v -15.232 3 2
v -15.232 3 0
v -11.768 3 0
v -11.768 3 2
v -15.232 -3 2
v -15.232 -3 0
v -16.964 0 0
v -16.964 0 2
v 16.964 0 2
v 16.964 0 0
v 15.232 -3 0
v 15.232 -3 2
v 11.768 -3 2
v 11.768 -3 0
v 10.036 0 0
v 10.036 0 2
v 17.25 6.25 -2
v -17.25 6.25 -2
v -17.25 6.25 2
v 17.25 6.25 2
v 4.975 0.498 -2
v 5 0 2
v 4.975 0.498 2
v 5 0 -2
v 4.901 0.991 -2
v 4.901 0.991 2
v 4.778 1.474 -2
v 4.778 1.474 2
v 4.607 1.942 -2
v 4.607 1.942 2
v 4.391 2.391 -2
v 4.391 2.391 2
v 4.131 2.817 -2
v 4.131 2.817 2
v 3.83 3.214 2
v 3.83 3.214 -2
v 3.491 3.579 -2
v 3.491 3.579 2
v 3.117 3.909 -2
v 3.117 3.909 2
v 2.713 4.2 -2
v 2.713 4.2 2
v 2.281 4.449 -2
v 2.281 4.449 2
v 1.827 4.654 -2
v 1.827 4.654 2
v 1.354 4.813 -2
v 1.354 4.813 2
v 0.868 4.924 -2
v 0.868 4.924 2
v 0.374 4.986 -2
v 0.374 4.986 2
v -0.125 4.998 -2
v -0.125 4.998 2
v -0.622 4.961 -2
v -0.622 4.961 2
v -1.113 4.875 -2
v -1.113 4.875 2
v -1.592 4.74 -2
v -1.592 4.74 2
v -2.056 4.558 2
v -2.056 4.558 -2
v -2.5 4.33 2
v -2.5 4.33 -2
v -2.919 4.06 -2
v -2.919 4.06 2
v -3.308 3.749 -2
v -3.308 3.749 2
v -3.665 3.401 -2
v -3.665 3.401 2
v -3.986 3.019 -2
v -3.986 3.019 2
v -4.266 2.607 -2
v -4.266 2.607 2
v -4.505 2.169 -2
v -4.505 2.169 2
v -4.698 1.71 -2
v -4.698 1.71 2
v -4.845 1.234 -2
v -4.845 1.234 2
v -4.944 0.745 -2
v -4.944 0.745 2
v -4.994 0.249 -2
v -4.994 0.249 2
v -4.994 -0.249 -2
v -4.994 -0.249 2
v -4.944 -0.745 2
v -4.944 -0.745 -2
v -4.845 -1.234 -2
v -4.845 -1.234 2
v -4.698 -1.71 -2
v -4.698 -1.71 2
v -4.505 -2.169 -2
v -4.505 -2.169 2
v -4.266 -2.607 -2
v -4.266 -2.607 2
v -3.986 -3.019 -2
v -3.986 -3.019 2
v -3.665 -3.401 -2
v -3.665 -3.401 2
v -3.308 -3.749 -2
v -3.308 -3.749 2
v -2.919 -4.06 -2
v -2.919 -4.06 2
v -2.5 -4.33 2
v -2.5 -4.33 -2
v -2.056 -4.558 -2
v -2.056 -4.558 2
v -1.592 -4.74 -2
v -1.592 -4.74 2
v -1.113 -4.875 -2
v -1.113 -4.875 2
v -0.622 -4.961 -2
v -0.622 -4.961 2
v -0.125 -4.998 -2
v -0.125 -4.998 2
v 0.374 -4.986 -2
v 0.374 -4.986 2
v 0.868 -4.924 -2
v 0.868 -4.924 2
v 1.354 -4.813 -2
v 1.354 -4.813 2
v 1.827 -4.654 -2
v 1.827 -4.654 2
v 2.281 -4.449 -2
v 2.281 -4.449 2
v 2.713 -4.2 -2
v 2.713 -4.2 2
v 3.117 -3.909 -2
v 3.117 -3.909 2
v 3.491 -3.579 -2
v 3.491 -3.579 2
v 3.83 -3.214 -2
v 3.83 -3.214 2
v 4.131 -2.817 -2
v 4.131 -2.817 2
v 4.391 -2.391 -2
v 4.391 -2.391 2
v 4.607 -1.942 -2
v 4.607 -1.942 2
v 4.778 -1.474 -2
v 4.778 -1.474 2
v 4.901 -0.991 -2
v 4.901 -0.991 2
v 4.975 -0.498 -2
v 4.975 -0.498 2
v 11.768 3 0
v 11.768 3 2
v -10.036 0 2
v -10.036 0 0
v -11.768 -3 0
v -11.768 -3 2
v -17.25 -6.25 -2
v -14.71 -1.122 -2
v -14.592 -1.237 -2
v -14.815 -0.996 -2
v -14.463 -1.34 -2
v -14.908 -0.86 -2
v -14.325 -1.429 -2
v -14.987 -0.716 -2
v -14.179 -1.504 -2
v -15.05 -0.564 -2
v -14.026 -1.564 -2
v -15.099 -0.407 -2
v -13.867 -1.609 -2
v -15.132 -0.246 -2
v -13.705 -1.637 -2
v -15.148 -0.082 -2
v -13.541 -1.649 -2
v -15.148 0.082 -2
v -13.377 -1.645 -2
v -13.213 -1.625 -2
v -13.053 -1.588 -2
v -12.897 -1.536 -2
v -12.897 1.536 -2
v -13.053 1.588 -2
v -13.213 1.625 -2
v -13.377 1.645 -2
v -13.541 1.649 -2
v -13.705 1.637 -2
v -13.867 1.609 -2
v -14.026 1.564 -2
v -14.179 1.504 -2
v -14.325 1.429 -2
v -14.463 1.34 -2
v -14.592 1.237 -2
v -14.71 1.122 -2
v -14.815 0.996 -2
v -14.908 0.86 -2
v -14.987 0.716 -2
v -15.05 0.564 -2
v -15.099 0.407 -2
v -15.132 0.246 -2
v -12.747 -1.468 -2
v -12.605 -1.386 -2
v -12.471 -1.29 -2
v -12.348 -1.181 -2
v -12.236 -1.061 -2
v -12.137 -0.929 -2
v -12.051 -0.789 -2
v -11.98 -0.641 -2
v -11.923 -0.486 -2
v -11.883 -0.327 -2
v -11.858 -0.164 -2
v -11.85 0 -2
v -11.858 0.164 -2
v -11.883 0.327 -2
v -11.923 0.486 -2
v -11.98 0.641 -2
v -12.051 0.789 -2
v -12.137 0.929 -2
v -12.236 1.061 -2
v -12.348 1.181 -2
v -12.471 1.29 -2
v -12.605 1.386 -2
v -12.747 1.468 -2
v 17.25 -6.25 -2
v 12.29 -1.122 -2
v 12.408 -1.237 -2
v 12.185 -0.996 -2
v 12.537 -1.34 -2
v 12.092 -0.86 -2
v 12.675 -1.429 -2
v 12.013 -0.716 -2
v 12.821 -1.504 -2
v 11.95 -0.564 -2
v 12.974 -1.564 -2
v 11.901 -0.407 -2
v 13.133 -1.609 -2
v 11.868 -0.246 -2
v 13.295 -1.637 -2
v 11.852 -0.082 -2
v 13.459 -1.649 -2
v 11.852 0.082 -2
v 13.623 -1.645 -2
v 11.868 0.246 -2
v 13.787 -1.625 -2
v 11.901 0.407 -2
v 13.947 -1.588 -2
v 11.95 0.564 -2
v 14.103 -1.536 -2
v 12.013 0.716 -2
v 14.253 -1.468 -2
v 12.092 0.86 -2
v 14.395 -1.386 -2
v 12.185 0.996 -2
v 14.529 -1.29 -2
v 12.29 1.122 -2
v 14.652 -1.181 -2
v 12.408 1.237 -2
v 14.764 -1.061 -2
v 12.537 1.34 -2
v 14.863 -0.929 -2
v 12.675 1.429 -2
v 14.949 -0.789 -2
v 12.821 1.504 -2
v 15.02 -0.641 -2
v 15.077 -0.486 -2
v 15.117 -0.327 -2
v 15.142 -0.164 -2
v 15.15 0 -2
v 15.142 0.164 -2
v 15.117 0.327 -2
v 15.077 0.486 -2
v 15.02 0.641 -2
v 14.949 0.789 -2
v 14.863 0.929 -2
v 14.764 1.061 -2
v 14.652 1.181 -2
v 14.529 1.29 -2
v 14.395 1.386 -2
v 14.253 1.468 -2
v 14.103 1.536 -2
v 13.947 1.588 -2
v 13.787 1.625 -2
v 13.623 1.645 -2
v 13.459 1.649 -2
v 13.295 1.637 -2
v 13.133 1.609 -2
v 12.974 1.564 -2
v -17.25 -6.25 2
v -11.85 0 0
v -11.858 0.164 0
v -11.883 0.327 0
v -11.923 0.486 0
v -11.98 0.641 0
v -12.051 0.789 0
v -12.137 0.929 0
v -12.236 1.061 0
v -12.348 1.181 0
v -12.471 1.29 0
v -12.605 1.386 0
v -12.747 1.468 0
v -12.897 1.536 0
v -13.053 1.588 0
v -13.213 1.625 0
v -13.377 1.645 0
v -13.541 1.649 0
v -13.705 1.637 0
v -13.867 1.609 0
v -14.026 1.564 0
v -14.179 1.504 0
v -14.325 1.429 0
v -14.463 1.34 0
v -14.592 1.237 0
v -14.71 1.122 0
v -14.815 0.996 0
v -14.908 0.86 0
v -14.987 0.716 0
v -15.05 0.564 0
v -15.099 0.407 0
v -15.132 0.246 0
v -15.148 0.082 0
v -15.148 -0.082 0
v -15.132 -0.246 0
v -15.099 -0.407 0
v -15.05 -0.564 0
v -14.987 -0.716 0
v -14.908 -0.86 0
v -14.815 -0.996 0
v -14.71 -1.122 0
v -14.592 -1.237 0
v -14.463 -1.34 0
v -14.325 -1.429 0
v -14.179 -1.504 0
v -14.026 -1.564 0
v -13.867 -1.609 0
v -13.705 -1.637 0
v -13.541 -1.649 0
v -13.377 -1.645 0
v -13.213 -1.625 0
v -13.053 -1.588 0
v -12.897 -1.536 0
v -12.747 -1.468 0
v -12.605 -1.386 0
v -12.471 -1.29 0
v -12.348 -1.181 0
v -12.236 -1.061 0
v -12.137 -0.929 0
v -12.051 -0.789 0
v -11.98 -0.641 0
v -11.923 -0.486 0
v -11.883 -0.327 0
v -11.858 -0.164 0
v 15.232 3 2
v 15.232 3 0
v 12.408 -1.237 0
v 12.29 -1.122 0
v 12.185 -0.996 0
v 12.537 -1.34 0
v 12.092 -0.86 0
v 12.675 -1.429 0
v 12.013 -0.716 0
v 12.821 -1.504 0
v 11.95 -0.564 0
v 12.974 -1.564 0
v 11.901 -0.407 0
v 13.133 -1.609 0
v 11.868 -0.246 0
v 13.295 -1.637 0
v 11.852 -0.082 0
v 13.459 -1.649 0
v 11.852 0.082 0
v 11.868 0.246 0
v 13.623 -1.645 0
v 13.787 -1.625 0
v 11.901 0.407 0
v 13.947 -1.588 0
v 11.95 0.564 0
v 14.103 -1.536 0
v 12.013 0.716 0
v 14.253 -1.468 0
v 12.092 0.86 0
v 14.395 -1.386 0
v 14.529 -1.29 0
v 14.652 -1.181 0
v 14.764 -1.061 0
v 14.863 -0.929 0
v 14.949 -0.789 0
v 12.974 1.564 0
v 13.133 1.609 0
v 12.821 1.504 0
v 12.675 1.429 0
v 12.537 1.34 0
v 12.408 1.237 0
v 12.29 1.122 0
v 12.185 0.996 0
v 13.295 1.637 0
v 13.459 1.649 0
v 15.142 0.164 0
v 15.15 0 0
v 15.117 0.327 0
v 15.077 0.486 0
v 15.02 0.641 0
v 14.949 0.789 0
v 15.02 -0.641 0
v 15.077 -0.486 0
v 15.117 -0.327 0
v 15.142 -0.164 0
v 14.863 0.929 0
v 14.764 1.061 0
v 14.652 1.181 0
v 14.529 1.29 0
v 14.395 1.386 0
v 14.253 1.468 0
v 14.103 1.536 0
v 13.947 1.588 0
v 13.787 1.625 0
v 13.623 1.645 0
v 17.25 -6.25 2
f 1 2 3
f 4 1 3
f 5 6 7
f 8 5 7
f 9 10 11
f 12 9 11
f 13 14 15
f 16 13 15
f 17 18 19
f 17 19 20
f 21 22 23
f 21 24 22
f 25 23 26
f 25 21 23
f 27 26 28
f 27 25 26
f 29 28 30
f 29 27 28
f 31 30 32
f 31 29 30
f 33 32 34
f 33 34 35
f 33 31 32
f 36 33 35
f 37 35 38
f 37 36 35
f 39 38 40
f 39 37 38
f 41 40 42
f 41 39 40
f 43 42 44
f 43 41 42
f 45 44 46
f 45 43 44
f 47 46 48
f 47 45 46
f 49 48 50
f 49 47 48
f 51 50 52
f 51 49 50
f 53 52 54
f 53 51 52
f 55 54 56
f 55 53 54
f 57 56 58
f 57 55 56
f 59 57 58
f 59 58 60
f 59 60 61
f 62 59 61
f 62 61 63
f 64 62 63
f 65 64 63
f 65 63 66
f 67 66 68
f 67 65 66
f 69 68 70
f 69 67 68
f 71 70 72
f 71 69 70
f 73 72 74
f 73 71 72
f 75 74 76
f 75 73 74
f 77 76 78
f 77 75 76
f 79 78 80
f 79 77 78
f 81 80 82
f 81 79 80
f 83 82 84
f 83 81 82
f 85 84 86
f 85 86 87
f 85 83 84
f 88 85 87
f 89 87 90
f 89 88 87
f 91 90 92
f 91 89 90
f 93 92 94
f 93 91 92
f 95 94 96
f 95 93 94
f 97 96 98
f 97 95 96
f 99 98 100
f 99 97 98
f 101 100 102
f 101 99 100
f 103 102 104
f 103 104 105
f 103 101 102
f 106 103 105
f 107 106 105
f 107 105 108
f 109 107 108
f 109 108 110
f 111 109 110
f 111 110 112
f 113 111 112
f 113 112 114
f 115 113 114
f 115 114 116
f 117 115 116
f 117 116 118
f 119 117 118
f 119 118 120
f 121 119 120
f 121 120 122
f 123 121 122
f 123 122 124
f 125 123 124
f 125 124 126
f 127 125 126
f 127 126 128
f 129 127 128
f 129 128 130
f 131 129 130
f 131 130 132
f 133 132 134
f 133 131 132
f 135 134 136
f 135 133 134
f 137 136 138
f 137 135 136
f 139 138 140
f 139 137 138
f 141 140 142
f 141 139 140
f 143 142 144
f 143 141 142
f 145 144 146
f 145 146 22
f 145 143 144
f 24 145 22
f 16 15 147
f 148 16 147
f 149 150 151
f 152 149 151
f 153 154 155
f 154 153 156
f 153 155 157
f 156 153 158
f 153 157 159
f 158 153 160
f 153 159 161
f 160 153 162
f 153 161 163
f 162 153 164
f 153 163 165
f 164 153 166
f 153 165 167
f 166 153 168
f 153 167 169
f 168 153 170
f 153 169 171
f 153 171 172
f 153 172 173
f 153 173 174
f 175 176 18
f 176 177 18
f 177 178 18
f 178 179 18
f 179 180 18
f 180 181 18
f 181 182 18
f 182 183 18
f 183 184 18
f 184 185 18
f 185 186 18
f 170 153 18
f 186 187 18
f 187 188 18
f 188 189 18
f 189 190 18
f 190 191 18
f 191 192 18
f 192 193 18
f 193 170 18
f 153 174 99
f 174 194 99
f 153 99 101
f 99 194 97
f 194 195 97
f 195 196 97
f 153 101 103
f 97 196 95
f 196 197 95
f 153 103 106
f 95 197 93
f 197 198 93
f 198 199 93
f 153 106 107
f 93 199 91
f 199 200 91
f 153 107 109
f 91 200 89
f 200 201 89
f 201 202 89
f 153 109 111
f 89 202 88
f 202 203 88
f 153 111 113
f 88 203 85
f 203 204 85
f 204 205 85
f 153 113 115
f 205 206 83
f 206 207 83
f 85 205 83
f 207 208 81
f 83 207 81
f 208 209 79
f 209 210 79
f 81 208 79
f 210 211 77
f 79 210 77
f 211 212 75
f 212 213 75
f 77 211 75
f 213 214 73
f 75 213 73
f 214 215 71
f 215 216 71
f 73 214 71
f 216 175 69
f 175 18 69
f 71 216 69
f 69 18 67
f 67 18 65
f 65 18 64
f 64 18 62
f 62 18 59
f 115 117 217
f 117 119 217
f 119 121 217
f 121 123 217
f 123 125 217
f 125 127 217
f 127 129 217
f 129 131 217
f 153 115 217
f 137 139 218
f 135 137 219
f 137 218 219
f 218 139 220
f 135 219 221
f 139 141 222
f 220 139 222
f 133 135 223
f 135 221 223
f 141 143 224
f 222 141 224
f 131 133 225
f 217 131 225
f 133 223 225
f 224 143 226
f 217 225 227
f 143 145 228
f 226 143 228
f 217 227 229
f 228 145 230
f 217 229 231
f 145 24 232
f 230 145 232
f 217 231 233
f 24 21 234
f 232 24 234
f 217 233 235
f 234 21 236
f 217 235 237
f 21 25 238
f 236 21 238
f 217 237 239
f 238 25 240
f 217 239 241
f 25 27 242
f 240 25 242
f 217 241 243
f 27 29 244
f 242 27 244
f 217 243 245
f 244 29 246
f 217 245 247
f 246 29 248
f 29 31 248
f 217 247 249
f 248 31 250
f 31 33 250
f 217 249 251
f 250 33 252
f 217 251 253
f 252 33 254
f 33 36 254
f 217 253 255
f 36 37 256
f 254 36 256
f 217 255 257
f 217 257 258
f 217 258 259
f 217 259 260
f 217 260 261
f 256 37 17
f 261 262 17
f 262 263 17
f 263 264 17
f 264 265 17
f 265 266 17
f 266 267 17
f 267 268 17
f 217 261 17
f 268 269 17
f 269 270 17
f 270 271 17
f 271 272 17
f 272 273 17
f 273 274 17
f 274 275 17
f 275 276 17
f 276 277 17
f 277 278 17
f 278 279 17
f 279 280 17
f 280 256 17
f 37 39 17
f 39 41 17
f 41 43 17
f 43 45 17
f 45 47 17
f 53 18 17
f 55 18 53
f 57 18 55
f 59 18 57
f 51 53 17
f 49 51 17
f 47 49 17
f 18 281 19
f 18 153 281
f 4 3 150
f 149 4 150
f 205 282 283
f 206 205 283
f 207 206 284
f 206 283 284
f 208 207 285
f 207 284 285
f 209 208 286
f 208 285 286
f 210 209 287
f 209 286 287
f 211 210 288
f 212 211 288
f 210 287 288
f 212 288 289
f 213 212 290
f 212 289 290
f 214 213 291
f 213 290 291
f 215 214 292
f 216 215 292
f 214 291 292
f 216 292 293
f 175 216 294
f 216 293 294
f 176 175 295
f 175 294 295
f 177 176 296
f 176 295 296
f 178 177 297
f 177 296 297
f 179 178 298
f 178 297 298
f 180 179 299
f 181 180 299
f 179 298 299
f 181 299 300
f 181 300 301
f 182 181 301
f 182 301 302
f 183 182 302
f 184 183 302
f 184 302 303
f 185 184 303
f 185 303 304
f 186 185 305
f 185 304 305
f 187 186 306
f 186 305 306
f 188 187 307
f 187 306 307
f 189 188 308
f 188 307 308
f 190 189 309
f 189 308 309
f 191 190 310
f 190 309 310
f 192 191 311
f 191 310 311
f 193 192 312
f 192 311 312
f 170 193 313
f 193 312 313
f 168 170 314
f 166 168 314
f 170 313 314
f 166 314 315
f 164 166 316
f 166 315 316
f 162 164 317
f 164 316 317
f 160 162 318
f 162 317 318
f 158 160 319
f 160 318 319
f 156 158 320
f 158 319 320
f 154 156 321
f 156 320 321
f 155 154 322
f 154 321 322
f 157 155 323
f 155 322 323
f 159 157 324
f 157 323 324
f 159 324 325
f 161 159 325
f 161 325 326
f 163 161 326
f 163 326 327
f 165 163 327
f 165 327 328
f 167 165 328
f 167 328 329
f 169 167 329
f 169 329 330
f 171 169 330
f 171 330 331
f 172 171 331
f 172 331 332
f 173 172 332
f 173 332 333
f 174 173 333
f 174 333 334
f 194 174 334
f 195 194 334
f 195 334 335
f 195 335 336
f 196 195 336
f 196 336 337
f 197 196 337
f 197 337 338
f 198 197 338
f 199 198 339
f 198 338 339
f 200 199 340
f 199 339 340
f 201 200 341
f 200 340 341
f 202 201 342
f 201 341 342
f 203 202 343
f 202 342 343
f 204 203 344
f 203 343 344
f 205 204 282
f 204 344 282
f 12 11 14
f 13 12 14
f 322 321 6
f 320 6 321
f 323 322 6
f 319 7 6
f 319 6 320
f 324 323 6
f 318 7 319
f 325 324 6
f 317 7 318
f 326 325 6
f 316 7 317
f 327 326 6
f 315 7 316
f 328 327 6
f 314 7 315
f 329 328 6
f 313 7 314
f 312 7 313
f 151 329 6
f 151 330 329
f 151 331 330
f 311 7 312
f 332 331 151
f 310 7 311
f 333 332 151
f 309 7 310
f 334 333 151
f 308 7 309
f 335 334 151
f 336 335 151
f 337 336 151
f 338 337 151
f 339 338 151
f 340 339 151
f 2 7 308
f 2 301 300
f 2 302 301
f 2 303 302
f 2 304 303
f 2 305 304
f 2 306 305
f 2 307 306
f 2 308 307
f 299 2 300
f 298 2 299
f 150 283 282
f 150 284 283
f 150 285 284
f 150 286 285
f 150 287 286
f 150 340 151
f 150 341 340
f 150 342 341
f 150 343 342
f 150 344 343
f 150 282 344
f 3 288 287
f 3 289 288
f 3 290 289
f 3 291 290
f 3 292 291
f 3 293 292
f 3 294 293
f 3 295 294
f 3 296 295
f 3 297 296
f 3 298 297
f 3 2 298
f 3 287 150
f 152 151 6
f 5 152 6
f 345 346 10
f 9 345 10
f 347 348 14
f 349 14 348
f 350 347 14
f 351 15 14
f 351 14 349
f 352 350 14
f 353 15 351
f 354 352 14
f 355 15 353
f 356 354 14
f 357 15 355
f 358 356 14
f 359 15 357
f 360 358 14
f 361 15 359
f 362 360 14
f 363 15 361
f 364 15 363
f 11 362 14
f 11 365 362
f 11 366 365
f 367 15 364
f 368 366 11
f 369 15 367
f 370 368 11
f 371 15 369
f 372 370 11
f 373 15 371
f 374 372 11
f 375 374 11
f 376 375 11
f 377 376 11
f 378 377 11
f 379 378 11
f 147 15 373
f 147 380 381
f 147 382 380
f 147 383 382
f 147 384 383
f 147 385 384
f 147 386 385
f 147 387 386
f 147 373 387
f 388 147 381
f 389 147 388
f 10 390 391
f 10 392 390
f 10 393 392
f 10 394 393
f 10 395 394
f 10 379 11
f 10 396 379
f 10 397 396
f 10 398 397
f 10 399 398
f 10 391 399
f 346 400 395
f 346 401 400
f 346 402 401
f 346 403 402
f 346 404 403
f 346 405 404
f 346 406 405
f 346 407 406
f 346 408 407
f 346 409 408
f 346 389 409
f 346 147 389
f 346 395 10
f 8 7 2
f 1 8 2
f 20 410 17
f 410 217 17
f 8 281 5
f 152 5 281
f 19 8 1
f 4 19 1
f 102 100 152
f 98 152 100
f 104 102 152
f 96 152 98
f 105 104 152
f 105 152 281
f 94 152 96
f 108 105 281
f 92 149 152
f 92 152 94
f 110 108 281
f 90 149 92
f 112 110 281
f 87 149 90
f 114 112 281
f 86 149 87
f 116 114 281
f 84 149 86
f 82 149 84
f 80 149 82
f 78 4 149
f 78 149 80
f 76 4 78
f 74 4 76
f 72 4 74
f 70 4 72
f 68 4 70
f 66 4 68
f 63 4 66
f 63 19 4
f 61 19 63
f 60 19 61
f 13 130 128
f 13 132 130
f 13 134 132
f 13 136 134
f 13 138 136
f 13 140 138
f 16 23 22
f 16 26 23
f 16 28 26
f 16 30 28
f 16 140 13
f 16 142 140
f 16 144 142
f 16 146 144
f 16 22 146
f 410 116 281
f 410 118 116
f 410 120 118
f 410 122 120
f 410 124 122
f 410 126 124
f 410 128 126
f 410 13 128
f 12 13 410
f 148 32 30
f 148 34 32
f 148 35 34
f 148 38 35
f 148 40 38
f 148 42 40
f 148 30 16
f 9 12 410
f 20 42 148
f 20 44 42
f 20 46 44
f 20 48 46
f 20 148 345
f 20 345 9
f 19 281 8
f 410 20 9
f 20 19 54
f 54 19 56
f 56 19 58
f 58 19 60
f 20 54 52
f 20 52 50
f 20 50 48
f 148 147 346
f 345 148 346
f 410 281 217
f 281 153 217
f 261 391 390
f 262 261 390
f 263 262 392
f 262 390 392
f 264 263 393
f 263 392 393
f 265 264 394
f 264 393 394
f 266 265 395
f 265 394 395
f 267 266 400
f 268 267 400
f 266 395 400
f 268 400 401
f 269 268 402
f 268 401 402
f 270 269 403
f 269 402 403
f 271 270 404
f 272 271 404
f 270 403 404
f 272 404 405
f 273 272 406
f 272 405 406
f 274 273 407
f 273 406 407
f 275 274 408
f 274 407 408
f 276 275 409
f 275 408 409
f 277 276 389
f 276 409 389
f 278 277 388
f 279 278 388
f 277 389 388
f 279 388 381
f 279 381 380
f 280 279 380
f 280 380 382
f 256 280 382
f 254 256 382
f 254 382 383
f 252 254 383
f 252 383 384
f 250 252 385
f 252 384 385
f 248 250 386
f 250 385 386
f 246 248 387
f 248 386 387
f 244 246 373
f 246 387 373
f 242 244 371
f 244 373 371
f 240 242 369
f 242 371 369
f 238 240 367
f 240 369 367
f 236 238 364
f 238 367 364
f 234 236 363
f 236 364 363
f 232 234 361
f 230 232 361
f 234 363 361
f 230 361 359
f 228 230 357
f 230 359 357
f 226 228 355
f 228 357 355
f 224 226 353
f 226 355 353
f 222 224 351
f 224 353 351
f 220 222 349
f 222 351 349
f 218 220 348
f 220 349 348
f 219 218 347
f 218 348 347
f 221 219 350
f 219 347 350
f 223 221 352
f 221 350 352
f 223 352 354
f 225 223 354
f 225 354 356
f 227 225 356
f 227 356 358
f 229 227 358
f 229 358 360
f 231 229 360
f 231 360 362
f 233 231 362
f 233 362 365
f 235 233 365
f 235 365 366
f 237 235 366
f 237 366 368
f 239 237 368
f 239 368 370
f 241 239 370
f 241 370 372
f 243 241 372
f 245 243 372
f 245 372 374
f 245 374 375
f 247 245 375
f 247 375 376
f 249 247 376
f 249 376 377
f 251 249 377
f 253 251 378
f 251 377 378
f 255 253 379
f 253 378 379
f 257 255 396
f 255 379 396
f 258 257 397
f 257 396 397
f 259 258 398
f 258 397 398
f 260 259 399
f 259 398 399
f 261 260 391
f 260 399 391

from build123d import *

# Parameters (mm, degrees)
F0_W     = 34.5
F0_H     = 12.5
F0_R     = 5
F0_R_2   = 1.65
F1_DEPTH = 2
F2_DEPTH = 2


with BuildPart() as f1:
    # F0 (on Top) → F1 (new body)
    with BuildSketch(Plane.XY):
        Rectangle(F0_W, F0_H)
        Polygon((-16.9641016151, 0), (-15.2320508076, 3), (-11.7679491924, 3), (-10.0358983849, 0), (-11.7679491924, -3), (-15.2320508076, -3), align=None, mode=Mode.SUBTRACT)
        Circle(F0_R, mode=Mode.SUBTRACT)
        Polygon((10.0358983849, 0), (11.7679491924, 3), (15.2320508076, 3), (16.9641016151, 0), (15.2320508076, -3), (11.7679491924, -3), align=None, mode=Mode.SUBTRACT)
        Polygon((-11.7679491924, 3), (-15.2320508076, 3), (-16.9641016151, 0), (-15.2320508076, -3), (-11.7679491924, -3), (-10.0358983849, 0), align=None)
        with Locations((-13.5, 0)):
            Circle(F0_R_2, mode=Mode.SUBTRACT)
        Polygon((15.2320508076, 3), (11.7679491924, 3), (10.0358983849, 0), (11.7679491924, -3), (15.2320508076, -3), (16.9641016151, 0), align=None)
        with Locations((13.5, 0)):
            Circle(F0_R_2, mode=Mode.SUBTRACT)
    extrude(amount=-F1_DEPTH)

    # F0 (on Top) → F2 (join)
    with BuildSketch(Plane.XY):
        Rectangle(F0_W, F0_H)
        Polygon((-16.9641016151, 0), (-15.2320508076, 3), (-11.7679491924, 3), (-10.0358983849, 0), (-11.7679491924, -3), (-15.2320508076, -3), align=None, mode=Mode.SUBTRACT)
        Circle(F0_R, mode=Mode.SUBTRACT)
        Polygon((10.0358983849, 0), (11.7679491924, 3), (15.2320508076, 3), (16.9641016151, 0), (15.2320508076, -3), (11.7679491924, -3), align=None, mode=Mode.SUBTRACT)
    extrude(amount=F2_DEPTH)


solid = f1.part
